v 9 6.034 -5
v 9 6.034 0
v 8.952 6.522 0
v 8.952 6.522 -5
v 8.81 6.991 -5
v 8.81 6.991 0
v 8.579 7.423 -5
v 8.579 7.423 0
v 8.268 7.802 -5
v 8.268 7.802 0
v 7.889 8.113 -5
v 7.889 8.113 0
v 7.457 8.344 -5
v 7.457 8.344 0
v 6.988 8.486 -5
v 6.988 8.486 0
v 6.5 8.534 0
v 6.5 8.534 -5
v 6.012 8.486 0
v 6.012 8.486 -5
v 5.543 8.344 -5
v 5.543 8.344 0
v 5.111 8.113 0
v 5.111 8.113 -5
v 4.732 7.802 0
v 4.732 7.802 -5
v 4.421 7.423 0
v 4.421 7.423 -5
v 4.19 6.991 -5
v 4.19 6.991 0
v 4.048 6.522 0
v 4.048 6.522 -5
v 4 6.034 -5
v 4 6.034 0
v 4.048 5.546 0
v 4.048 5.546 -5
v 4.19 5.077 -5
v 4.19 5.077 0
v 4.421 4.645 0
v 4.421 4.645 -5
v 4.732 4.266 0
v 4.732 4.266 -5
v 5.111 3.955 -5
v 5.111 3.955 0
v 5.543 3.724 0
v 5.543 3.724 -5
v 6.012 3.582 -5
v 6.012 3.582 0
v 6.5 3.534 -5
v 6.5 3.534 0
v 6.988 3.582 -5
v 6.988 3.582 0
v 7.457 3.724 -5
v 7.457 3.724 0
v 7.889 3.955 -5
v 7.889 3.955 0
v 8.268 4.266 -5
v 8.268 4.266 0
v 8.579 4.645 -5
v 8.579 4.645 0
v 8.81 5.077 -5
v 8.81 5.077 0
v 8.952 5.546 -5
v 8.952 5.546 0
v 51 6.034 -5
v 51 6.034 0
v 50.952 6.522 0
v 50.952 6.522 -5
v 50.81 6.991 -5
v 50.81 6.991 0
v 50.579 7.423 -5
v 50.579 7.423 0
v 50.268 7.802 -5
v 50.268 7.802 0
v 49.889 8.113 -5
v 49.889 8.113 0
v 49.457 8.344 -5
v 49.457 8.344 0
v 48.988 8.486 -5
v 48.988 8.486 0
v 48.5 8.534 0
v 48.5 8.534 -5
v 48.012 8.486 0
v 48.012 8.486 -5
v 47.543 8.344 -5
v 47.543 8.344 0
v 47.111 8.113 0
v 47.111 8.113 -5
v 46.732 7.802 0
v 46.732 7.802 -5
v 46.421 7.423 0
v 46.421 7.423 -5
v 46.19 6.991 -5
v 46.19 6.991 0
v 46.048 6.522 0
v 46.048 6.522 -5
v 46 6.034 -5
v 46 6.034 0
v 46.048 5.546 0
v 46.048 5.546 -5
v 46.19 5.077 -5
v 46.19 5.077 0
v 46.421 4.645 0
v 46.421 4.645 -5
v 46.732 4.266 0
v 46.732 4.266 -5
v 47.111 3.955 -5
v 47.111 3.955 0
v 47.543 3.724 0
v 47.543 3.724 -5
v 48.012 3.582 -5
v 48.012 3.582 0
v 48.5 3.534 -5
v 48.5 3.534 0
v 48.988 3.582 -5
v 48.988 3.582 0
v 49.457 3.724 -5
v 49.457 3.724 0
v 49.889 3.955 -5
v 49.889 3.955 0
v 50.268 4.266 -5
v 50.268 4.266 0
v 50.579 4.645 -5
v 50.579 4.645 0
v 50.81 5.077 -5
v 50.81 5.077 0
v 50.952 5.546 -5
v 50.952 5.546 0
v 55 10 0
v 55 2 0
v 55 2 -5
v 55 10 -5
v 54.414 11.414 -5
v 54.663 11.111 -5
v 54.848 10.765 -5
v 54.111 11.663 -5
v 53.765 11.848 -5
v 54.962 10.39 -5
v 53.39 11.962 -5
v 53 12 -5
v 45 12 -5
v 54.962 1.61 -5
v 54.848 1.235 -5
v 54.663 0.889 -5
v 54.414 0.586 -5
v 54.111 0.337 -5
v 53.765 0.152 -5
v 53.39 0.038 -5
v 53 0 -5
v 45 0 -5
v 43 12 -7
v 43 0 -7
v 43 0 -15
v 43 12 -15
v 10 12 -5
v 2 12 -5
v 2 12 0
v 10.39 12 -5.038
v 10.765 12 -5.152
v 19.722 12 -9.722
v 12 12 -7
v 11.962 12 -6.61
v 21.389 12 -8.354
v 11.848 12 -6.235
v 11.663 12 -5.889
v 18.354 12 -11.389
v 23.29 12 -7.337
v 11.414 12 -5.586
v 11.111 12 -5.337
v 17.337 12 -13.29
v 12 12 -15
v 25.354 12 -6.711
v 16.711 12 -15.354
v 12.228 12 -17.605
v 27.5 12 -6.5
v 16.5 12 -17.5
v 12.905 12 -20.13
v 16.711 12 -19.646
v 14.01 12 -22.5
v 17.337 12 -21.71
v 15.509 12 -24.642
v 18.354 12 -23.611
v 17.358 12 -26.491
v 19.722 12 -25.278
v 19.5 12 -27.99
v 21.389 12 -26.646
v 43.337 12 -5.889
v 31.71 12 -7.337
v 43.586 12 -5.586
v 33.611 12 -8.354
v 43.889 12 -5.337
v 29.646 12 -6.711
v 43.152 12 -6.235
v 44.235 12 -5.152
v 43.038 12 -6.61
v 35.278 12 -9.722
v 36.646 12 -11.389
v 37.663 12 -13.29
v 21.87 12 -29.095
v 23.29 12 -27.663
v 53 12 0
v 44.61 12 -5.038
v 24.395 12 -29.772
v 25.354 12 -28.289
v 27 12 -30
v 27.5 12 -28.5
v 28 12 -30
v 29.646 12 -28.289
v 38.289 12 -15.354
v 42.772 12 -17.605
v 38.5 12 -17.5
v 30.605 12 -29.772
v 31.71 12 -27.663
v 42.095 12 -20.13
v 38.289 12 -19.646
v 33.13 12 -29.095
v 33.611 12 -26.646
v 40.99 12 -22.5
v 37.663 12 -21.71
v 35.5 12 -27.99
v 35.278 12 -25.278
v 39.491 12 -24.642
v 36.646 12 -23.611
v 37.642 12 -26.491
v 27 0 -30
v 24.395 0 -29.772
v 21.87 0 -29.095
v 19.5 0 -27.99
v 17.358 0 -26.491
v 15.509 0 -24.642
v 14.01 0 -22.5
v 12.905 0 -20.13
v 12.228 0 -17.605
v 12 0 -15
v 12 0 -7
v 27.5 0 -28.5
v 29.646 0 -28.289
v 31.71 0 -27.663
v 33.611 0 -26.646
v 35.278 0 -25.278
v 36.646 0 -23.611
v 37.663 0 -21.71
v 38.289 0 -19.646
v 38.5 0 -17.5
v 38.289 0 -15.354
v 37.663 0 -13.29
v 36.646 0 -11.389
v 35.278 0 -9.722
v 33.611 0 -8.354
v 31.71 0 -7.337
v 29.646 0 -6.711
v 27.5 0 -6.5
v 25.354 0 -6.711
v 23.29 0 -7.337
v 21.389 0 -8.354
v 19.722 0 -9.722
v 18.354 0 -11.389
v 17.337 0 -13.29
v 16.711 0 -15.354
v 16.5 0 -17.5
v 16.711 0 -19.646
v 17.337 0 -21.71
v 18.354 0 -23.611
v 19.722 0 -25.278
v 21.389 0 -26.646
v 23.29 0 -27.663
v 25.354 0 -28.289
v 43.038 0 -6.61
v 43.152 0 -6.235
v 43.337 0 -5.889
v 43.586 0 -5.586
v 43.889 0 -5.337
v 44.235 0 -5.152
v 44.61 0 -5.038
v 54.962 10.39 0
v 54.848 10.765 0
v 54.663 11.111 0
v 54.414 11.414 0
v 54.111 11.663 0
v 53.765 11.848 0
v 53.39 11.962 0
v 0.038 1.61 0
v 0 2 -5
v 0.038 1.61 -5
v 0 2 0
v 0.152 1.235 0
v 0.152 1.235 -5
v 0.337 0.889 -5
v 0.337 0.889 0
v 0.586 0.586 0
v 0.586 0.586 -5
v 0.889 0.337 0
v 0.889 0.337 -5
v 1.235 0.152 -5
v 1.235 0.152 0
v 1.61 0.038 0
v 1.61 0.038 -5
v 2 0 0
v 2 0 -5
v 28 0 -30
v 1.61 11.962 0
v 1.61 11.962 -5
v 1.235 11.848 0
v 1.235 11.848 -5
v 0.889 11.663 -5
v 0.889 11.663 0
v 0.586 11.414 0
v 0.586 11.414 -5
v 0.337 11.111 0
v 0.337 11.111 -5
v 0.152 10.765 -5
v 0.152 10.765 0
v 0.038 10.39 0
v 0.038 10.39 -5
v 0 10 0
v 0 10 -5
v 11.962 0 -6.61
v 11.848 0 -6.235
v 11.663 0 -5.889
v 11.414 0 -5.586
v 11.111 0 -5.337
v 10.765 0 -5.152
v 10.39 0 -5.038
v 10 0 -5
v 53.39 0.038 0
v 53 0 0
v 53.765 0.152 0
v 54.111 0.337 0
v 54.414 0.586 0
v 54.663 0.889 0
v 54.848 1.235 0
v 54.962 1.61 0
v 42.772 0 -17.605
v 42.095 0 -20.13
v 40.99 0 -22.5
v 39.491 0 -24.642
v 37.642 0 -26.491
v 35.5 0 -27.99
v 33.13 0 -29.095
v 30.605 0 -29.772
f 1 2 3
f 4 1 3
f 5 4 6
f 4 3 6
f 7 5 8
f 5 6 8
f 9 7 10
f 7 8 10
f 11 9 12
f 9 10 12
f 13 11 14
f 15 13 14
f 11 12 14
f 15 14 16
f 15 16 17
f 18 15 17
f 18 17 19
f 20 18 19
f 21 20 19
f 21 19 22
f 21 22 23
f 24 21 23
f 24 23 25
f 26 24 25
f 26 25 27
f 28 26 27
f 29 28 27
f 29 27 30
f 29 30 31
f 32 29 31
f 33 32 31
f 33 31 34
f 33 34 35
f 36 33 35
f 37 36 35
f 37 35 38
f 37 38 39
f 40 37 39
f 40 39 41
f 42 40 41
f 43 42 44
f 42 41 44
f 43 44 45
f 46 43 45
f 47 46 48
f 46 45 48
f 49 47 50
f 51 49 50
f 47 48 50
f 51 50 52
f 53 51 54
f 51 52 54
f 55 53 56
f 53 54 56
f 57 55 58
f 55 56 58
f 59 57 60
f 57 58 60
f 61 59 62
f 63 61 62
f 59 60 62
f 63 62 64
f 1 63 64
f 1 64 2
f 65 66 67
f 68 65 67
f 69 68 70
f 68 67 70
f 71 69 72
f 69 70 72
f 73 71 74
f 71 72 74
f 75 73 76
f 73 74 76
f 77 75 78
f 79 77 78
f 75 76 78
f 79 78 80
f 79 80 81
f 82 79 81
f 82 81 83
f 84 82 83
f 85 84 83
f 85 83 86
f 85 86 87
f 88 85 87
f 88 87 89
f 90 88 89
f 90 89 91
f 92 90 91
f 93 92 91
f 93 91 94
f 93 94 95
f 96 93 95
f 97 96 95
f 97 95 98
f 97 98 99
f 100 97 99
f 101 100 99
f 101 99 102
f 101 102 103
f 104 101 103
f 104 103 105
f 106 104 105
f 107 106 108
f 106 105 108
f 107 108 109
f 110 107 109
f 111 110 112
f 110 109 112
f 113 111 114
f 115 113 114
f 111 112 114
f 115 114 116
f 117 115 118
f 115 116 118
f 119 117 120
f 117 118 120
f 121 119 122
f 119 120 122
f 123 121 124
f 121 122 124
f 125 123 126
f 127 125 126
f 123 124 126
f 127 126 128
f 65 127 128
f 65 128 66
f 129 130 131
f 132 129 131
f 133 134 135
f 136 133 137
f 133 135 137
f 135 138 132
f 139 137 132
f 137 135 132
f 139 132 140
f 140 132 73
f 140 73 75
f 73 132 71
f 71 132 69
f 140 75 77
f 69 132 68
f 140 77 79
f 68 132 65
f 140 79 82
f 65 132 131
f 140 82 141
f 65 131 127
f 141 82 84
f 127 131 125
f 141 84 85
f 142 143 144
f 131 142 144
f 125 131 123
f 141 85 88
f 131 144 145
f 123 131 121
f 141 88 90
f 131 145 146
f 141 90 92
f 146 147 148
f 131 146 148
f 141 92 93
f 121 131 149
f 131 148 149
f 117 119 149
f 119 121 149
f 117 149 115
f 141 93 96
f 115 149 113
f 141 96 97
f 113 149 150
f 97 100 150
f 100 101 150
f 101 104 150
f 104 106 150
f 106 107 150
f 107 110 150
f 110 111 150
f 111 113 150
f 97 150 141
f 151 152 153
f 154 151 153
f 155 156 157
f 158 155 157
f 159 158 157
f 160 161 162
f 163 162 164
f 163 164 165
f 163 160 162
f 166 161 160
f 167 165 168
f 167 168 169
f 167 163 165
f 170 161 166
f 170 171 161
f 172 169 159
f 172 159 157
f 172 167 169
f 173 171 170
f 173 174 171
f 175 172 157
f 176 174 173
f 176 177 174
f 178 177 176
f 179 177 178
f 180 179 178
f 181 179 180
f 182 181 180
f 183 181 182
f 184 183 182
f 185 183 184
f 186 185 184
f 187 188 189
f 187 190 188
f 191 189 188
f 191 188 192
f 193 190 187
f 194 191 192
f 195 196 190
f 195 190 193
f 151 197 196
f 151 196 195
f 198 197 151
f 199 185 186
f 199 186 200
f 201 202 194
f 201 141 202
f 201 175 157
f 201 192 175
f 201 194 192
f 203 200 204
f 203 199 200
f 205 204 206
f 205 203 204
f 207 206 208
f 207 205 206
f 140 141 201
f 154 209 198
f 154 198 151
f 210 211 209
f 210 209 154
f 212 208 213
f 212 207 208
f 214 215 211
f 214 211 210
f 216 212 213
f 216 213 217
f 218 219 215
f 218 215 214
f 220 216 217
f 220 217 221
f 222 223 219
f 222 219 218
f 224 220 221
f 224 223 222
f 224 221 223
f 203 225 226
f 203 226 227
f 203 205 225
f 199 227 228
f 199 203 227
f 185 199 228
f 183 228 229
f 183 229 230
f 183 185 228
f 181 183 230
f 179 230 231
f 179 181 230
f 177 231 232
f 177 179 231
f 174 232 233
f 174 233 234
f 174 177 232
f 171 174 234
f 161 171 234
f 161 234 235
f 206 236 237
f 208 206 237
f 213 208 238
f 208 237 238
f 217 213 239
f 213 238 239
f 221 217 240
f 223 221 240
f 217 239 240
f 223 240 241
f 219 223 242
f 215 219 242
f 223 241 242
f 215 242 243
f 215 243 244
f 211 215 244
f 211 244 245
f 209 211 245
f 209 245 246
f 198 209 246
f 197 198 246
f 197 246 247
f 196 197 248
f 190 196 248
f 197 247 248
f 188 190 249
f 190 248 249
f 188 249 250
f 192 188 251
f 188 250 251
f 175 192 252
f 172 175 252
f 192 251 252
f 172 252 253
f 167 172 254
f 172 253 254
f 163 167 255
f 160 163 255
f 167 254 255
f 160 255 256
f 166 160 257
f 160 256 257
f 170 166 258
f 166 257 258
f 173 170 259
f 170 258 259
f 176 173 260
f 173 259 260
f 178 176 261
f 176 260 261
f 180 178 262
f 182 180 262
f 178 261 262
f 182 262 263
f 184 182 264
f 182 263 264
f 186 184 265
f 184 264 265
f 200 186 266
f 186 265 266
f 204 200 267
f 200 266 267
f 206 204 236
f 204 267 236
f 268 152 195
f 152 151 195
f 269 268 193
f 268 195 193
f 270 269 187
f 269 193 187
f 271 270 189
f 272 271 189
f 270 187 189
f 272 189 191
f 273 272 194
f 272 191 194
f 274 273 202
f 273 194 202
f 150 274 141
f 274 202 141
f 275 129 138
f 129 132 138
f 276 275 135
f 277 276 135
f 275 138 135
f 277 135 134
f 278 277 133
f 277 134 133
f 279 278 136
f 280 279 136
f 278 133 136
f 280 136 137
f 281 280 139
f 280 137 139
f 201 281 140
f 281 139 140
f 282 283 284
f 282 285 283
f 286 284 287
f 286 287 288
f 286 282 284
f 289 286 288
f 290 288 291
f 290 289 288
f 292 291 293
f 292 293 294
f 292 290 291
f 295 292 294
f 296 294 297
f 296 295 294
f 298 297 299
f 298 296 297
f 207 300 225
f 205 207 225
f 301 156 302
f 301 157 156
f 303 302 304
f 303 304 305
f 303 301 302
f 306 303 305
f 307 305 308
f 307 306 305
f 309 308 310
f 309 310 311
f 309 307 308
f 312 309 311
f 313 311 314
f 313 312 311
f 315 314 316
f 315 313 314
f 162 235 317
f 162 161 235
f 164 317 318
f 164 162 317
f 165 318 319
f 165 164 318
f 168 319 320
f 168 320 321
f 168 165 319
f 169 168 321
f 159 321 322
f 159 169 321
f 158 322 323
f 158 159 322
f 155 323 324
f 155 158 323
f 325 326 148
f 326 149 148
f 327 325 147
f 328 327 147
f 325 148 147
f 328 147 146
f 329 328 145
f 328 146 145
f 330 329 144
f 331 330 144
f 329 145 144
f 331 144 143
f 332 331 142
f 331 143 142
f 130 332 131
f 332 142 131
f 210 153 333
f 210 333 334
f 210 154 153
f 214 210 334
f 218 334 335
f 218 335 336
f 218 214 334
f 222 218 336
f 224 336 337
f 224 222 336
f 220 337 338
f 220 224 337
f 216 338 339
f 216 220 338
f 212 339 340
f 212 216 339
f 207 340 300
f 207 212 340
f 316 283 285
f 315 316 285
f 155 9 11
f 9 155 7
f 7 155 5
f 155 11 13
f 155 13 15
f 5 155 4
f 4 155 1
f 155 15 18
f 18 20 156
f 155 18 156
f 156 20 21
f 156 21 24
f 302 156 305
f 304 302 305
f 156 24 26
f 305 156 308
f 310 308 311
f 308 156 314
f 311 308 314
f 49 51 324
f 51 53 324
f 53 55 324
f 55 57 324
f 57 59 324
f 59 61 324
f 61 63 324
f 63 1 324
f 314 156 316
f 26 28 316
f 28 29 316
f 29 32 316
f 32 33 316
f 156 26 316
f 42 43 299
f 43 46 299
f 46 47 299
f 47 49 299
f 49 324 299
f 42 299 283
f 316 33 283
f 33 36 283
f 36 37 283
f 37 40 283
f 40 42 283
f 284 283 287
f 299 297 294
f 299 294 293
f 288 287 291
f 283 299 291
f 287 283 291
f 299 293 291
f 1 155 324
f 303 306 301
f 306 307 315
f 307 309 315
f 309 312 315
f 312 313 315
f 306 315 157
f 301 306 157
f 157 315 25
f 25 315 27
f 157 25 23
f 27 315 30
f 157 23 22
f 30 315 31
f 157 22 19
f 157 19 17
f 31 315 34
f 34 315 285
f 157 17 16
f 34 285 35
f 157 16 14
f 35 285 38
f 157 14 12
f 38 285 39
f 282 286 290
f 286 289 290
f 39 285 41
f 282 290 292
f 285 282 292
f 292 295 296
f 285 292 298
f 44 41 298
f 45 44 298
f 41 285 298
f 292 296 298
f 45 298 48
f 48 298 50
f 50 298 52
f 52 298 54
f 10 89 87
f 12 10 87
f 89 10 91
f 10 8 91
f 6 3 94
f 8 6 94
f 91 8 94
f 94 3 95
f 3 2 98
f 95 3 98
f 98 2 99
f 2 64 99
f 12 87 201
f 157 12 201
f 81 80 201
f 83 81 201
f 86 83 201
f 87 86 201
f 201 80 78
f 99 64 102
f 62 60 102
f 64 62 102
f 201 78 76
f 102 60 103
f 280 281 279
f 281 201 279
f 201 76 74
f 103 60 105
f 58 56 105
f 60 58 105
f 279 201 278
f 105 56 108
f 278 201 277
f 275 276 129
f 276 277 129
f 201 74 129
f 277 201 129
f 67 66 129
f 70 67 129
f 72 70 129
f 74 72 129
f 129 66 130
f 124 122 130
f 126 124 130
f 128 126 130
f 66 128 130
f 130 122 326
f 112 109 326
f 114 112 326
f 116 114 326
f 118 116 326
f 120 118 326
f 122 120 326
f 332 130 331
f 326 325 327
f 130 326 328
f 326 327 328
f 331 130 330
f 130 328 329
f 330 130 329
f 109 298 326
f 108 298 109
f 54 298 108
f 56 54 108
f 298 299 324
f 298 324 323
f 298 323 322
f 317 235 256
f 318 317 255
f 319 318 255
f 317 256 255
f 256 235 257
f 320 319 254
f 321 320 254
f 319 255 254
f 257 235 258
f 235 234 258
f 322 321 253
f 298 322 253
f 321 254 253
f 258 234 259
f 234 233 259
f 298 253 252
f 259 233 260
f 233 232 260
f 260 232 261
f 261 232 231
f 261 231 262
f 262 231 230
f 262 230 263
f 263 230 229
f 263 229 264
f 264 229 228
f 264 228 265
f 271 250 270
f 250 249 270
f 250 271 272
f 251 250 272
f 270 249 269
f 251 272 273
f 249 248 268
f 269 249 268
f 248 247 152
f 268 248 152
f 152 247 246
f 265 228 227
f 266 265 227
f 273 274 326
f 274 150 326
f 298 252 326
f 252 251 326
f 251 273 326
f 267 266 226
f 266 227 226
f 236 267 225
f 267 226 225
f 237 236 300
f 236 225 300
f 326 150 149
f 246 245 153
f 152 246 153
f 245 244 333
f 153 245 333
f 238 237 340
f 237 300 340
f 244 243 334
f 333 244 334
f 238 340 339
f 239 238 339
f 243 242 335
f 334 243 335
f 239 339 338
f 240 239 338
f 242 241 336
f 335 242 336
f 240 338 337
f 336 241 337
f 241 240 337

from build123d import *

# Parameters (mm, degrees)
BOSS_EXTRUDE1_DEPTH = 12
SKETCH3_R           = 11
CUT_EXTRUDE1_DEPTH  = 12
FILLET1_R           = 15
FILLET2_R           = 15
FILLET3_R           = 2
FILLET4_R           = 2
SKETCH4_R           = 2.5
CUT_EXTRUDE2_DEPTH  = 12
FILLET5_R           = 2
FILLET6_R           = 2
FILLET7_R           = 2
FILLET8_R           = 2


with BuildPart() as part:
    # Sketch2 → Boss-Extrude1 (new body)
    with BuildSketch(Plane(origin=(0, 0, 0), x_dir=(1, 0, 0), z_dir=(0, 1, 0))):
        Polygon((0, 0), (55, 0), (55, 5), (43, 5), (43, 30), (12, 30), (12, 5), (0, 5), align=None)
    extrude(amount=BOSS_EXTRUDE1_DEPTH)

    # Sketch3 → Cut-Extrude1 (cut)
    with BuildSketch(Plane.XZ):
        with Locations(Location((27.5, -17.5, 0), (0, 0, 270))):
            Circle(SKETCH3_R)
    extrude(amount=-CUT_EXTRUDE1_DEPTH, mode=Mode.SUBTRACT)

    # Fillet1
    fillet1_edges = [part.edges().sort_by_distance(p)[0] for p in [
        (43, 6, -30),
    ]]
    fillet(fillet1_edges, radius=FILLET1_R)

    # Fillet2
    fillet2_edges = [part.edges().sort_by_distance(p)[0] for p in [
        (12, 6, -30),
    ]]
    fillet(fillet2_edges, radius=FILLET2_R)

    # Fillet3
    fillet3_edges = [part.edges().sort_by_distance(p)[0] for p in [
        (12, 6, -5),
    ]]
    fillet(fillet3_edges, radius=FILLET3_R)

    # Fillet4
    fillet4_edges = [part.edges().sort_by_distance(p)[0] for p in [
        (43, 6, -5),
    ]]
    fillet(fillet4_edges, radius=FILLET4_R)

    # Sketch4 → Cut-Extrude2 (cut)
    with BuildSketch(Plane.XY):
        with Locations((48.5, 6.034122725)):
            Circle(SKETCH4_R)
        with Locations((6.5, 6.034122725)):
            Circle(SKETCH4_R)
    extrude(amount=-CUT_EXTRUDE2_DEPTH, mode=Mode.SUBTRACT)

    # Fillet5
    fillet5_edges = [part.edges().sort_by_distance(p)[0] for p in [
        (55, 0, -2.5),
    ]]
    fillet(fillet5_edges, radius=FILLET5_R)

    # Fillet6
    fillet6_edges = [part.edges().sort_by_distance(p)[0] for p in [
        (55, 12, -2.5),
    ]]
    fillet(fillet6_edges, radius=FILLET6_R)

    # Fillet7
    fillet7_edges = [part.edges().sort_by_distance(p)[0] for p in [
        (0, 12, -2.5),
    ]]
    fillet(fillet7_edges, radius=FILLET7_R)

    # Fillet8
    fillet8_edges = [part.edges().sort_by_distance(p)[0] for p in [
        (0, 0, -2.5),
    ]]
    fillet(fillet8_edges, radius=FILLET8_R)


solid = part.part
